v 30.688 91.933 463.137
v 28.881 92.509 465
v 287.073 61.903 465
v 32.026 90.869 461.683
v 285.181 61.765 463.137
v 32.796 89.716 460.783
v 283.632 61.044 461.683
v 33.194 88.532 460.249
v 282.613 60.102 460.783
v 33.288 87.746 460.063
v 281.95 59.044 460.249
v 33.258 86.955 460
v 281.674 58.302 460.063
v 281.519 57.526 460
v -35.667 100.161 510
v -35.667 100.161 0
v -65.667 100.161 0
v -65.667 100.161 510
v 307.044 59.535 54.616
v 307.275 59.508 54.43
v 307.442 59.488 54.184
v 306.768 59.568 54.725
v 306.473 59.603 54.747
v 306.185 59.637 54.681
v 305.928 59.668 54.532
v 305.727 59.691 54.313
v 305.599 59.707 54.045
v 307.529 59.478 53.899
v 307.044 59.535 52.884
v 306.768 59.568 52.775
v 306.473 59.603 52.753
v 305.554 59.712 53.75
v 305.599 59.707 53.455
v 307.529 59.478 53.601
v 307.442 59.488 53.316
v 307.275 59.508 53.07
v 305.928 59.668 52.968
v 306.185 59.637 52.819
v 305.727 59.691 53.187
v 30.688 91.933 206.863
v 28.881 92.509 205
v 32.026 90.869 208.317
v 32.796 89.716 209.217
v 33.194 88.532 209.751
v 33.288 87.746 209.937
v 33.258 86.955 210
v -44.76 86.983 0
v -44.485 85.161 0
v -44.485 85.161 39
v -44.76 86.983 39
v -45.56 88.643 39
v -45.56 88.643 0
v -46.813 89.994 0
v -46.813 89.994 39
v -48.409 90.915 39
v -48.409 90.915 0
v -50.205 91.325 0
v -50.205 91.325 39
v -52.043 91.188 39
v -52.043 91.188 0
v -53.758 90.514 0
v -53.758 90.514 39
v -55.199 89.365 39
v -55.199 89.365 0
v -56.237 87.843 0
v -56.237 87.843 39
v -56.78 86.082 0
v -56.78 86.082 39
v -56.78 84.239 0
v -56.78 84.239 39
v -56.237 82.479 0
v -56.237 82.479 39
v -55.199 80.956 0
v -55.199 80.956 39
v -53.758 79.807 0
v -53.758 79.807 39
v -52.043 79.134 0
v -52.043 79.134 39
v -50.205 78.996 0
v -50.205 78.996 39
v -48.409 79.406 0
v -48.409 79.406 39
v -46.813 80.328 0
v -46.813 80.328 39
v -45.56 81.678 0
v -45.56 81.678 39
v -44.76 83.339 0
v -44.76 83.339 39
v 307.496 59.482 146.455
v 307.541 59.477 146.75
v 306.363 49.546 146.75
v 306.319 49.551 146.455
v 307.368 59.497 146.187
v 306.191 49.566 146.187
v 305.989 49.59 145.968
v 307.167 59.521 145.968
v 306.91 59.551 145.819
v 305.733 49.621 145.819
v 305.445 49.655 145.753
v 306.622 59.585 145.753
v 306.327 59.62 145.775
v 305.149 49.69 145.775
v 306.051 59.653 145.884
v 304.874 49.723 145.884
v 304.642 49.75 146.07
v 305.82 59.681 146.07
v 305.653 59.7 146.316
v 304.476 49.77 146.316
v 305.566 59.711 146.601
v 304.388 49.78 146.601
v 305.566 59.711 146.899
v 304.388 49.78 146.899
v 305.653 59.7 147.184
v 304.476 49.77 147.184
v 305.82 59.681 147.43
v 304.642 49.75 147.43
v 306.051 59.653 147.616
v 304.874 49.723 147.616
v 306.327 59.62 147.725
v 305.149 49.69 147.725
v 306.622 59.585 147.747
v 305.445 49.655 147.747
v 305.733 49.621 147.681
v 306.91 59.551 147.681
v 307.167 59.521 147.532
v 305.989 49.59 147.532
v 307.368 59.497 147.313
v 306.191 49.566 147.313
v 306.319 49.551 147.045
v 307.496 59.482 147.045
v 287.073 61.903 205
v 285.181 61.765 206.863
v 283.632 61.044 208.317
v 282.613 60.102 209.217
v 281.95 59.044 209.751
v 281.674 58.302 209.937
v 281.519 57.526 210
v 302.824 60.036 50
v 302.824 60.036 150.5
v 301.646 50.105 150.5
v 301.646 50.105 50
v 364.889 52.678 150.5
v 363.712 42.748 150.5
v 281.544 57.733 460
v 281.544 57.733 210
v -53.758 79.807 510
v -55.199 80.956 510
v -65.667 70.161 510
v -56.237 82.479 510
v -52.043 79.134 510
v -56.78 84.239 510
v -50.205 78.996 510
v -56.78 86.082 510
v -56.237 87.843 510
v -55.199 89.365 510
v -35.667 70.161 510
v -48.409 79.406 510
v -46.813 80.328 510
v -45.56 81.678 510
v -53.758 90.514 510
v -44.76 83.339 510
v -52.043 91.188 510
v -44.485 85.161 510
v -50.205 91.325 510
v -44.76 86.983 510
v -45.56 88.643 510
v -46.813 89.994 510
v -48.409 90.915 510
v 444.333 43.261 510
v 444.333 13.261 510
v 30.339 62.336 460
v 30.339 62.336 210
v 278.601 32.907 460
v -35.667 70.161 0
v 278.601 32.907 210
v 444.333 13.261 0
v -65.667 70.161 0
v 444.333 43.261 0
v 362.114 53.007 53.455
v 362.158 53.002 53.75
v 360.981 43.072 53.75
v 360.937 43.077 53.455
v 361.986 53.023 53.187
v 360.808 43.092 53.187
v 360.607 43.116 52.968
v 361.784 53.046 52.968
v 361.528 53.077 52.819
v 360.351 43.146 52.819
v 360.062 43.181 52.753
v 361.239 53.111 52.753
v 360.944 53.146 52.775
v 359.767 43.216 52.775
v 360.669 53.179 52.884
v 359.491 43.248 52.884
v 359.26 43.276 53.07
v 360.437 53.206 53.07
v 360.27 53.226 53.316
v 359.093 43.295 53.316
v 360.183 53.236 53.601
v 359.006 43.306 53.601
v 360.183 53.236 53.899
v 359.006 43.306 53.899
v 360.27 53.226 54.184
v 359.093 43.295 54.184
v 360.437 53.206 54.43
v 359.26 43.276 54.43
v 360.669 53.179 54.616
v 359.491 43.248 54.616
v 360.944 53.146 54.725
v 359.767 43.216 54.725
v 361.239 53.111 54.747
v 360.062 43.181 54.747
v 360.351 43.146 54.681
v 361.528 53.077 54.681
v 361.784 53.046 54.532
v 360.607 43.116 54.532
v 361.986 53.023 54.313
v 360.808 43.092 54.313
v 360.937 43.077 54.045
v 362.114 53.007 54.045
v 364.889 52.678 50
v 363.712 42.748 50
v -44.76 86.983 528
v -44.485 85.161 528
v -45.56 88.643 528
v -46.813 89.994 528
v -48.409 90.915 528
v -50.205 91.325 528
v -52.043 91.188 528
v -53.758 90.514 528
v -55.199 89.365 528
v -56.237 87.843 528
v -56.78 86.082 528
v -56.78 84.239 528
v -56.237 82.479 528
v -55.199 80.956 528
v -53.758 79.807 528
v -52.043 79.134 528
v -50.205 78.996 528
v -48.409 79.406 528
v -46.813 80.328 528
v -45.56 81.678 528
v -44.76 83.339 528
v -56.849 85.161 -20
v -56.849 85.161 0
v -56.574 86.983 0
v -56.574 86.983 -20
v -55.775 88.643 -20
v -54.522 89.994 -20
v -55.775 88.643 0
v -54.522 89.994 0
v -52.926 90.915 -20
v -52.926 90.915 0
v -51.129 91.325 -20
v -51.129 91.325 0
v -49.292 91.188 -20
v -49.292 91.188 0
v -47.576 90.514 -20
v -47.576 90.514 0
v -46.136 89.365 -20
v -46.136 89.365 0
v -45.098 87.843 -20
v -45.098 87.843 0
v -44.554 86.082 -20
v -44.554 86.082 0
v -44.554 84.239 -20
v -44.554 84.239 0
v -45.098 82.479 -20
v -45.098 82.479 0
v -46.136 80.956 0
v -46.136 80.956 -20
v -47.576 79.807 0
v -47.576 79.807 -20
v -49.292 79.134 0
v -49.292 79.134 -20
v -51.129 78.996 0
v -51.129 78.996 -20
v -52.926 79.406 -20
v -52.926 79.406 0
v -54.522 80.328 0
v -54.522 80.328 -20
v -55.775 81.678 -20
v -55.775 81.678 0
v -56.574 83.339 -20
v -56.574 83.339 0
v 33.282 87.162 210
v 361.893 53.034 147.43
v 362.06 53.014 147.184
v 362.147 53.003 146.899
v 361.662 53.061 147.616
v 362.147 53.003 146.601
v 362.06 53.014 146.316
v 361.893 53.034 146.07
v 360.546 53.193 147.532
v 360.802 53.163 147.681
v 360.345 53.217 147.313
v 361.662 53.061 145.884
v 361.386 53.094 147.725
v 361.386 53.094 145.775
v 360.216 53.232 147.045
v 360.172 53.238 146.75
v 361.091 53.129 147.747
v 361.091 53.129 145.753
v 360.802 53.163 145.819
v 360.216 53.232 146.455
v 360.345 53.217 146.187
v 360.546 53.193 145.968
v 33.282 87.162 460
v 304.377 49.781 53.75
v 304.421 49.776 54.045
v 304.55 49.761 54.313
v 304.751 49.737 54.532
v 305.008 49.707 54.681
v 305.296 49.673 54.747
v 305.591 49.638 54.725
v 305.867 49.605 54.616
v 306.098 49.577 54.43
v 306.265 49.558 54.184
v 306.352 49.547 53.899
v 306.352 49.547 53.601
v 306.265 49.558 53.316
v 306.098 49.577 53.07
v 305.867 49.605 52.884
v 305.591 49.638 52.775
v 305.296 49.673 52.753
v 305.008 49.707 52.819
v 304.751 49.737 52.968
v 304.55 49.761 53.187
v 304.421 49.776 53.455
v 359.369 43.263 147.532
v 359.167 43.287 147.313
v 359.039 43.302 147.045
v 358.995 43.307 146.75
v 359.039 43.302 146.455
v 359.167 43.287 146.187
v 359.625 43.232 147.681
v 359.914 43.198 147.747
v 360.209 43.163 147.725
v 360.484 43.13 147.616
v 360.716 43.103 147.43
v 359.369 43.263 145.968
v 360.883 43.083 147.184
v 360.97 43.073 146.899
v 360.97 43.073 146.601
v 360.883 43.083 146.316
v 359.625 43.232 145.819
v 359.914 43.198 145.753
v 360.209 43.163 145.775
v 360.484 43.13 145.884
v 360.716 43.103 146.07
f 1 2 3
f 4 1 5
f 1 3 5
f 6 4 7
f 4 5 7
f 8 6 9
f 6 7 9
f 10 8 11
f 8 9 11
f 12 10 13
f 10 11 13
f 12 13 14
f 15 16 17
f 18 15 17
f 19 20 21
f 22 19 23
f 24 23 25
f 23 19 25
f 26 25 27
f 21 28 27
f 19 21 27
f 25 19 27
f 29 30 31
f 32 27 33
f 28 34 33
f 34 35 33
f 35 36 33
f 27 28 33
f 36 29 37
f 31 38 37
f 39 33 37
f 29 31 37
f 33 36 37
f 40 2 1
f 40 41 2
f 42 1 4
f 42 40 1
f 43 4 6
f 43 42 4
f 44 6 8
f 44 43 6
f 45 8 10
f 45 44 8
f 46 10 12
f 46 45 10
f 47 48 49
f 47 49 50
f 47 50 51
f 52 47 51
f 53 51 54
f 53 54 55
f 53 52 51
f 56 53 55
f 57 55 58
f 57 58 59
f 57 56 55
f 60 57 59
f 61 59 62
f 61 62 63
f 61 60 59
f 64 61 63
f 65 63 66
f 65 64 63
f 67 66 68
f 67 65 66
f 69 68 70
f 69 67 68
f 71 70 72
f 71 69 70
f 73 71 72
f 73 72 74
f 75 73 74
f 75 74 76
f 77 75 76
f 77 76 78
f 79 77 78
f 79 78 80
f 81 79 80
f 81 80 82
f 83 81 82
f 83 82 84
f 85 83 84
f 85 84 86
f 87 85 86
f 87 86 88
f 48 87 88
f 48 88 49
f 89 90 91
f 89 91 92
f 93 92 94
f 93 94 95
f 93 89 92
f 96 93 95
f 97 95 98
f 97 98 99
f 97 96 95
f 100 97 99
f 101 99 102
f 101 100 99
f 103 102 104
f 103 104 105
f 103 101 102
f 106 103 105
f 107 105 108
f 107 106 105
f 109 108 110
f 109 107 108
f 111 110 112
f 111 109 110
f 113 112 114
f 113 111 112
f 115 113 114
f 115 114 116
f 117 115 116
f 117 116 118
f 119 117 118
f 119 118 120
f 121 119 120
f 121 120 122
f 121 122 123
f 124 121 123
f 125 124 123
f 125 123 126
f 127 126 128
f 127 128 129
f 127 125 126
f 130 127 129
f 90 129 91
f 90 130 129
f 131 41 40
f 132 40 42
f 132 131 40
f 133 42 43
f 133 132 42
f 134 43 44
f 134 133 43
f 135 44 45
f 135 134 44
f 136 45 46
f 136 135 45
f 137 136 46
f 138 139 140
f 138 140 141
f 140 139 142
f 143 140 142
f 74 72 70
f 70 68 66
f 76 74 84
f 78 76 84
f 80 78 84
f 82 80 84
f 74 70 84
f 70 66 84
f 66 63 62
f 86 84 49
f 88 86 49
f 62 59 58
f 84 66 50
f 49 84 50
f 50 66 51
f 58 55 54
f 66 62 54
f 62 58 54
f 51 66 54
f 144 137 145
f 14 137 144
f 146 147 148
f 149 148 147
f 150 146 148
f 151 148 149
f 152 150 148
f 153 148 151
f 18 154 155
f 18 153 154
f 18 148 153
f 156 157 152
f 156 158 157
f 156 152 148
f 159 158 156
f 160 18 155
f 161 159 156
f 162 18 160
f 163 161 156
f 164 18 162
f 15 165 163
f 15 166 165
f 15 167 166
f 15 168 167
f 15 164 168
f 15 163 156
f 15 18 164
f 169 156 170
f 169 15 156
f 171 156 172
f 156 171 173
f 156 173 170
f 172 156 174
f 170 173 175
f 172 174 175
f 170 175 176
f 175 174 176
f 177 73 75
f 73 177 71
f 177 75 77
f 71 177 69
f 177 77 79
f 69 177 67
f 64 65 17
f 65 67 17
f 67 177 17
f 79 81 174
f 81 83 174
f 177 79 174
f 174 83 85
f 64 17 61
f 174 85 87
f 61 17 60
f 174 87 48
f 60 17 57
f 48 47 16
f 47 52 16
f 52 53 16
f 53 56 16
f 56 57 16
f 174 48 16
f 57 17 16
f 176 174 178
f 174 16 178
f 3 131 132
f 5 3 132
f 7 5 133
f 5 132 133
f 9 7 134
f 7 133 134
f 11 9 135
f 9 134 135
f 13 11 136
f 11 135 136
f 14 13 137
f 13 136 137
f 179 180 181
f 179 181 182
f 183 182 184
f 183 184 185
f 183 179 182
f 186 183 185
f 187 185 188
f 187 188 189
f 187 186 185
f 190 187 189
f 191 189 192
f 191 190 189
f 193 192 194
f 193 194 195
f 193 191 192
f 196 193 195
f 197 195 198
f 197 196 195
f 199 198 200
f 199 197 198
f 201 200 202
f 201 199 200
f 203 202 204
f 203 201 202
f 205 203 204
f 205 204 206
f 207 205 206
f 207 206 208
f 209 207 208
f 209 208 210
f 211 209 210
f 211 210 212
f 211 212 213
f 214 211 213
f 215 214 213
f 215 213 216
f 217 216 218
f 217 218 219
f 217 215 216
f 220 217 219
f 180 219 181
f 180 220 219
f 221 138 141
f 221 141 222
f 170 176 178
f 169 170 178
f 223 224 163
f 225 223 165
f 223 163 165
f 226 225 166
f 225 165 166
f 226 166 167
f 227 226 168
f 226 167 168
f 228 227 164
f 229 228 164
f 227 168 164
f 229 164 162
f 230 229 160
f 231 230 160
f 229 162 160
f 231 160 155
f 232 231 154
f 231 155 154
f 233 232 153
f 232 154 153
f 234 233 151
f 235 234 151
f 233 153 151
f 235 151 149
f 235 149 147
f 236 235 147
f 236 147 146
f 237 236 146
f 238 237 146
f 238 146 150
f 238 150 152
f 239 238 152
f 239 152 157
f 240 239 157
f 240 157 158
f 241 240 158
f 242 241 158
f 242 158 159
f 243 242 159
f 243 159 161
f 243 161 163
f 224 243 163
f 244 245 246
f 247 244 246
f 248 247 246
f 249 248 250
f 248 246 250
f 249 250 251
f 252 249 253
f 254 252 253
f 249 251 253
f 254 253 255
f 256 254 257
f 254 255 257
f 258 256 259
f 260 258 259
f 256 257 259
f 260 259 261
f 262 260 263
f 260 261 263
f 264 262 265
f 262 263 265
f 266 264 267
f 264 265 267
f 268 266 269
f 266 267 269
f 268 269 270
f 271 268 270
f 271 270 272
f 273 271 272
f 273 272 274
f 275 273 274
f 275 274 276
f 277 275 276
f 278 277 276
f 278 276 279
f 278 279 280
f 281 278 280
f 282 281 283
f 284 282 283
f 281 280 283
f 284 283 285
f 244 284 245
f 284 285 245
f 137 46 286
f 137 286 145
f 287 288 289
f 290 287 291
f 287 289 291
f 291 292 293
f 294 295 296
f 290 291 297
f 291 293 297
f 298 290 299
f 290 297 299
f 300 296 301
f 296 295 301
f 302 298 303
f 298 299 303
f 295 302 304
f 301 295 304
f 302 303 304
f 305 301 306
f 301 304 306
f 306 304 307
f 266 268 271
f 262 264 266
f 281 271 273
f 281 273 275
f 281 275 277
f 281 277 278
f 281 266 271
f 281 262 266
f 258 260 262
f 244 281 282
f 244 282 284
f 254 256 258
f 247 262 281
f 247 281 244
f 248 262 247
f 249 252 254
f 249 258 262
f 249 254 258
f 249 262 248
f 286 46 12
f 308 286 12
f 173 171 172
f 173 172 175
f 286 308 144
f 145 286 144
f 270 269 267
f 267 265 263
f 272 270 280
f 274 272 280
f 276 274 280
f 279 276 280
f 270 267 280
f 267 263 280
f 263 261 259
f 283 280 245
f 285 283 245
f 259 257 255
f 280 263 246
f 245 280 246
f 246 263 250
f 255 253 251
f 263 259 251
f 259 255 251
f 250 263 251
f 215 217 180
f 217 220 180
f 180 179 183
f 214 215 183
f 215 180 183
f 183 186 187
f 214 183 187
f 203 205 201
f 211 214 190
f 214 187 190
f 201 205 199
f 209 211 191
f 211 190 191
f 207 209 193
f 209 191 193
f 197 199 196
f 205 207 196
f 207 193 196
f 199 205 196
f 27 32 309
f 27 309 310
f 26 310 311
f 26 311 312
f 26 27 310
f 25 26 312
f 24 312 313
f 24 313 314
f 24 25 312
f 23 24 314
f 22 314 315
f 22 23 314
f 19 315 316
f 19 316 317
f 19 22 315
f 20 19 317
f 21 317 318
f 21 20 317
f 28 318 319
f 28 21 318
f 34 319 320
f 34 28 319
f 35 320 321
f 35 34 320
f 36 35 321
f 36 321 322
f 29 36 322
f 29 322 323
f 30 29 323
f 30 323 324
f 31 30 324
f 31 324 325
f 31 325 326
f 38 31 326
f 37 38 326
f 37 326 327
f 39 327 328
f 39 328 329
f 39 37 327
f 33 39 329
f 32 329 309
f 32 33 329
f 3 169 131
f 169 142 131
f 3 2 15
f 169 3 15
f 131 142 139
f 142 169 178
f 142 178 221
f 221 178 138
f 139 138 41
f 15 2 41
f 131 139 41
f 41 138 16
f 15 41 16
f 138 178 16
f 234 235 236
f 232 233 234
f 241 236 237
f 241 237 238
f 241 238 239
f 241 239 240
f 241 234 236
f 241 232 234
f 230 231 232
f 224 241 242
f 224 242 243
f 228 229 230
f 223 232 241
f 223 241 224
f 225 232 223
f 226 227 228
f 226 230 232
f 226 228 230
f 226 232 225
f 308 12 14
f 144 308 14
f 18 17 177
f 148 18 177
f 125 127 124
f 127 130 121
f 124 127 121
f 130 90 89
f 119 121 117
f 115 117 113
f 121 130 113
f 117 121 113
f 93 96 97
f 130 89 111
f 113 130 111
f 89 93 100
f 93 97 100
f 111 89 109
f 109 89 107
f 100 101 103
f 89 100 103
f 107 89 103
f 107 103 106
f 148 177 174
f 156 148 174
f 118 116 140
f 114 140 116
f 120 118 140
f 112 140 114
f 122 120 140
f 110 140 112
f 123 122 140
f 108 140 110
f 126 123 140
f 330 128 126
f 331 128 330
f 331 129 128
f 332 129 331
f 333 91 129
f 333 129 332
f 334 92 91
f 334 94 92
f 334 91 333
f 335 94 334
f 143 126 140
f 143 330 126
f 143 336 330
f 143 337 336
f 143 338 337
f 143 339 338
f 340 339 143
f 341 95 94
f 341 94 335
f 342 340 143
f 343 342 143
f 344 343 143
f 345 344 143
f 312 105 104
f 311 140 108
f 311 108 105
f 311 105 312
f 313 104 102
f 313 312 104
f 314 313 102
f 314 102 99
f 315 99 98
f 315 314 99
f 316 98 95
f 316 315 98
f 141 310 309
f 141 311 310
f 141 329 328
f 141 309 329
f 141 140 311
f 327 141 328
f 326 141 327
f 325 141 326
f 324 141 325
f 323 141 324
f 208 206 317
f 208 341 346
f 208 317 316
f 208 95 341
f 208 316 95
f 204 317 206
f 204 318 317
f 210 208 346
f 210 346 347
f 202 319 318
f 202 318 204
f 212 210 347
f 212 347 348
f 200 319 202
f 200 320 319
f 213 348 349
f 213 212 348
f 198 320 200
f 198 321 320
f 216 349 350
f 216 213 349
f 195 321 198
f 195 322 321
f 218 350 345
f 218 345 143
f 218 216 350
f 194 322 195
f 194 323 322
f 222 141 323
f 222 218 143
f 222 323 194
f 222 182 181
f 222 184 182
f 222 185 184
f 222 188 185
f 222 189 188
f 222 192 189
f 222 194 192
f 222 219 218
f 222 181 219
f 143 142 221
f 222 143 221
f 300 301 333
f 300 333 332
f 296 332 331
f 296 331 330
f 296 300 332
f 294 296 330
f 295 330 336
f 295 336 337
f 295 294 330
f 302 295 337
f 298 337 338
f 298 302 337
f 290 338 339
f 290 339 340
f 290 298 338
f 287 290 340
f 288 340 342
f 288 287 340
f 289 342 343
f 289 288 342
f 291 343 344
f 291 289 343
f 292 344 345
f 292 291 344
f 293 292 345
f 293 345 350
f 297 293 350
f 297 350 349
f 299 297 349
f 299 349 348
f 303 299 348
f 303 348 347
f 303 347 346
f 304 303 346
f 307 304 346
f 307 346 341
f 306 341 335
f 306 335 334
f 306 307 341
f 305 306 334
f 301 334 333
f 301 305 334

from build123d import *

# Parameters (mm, degrees)
SKETCH1_R                = 6.181856154
BOSS_EXTRUDE2_DEPTH      = 510
BOSS_EXTRUDE3_DEPTH      = 18
BOSS_EXTRUDE3_DEPTH_BACK = 471
SKETCH2_R                = 6.181856154
SKETCH3_R                = 6.181856154
BOSS_EXTRUDE4_DEPTH      = 20
SKETCH4_W                = 62.5
SKETCH4_H                = 100.5
SKETCH4_R                = 1
CUT_EXTRUDE1_DEPTH       = 10
SKETCH5_W                = 250
SKETCH5_H                = 250
CUT_EXTRUDE2_DEPTH       = 10
FILLET1_R                = 5
SKETCH6_W                = 250
SKETCH6_H                = 250
CUT_EXTRUDE3_DEPTH       = 885
SKETCH7_W                = 250
SKETCH7_H                = 250
BOSS_EXTRUDE5_DEPTH      = 25


with BuildPart() as part:
    # Sketch1 → Boss-Extrude2 (new body)
    with BuildSketch(Plane.XY):
        Polygon((-65.667198797, 100.160717384), (-65.667198797, 70.160717384), (-35.667198797, 70.160717384), (444.332801203, 13.261021336), (444.332801203, 43.261021336), (-35.667198797, 100.160717384), align=None)
        with Locations((-50.667198797, 85.160717384)):
            Circle(SKETCH1_R, mode=Mode.SUBTRACT)
    extrude(amount=BOSS_EXTRUDE2_DEPTH)

    # Sketch2 → Boss-Extrude3 (add, two sides: drawn at the far end of the back side and taken through both)
    with BuildSketch(Plane.XY.offset(510).offset(-BOSS_EXTRUDE3_DEPTH_BACK)):
        with Locations((-50.667198797, 85.160717384)):
            Circle(SKETCH2_R)
    extrude(amount=BOSS_EXTRUDE3_DEPTH + BOSS_EXTRUDE3_DEPTH_BACK)

    # Sketch4 → Cut-Extrude1 (cut)
    with BuildSketch(Plane(origin=(11.214376154, 94.603327041, 0), x_dir=(0.9930472019055131, -0.11771684156326717, 0), z_dir=(0.11771684156326717, 0.9930472019055131, 0))):
        with Locations((324.900894155, -100.25)):
            Rectangle(SKETCH4_W, SKETCH4_H)
        with Locations(Location((297.400894155, -53.75, 0), (0, 0, 180))):
            Circle(SKETCH4_R, mode=Mode.SUBTRACT)
        with Locations((352.400894155, -53.75)):
            Circle(SKETCH4_R, mode=Mode.SUBTRACT)
        with Locations(Location((352.400894155, -146.75, 0), (0, 0, 180))):
            Circle(SKETCH4_R, mode=Mode.SUBTRACT)
        with Locations((297.400894155, -146.75)):
            Circle(SKETCH4_R, mode=Mode.SUBTRACT)
    extrude(amount=-CUT_EXTRUDE1_DEPTH, mode=Mode.SUBTRACT)

    # Sketch5 → Cut-Extrude2 (cut)
    with BuildSketch(Plane(origin=(11.214376154, 94.603327041, 0), x_dir=(0.9930472019055131, -0.11771684156326717, 0), z_dir=(0.11771684156326717, 0.9930472019055131, 0))):
        with Locations((147.790184736, -335)):
            Rectangle(SKETCH5_W, SKETCH5_H)
    extrude(amount=-CUT_EXTRUDE2_DEPTH, mode=Mode.SUBTRACT)

    # Fillet1
    fillet1_edges = [part.edges().sort_by_distance(p)[0] for p in [
        (33.846105337, 91.920538475, 335),
        (157.977005575, 77.205933279, 460),
        (282.107905813, 62.491328084, 335),
        (157.977005575, 77.205933279, 210),
    ]]
    fillet(fillet1_edges, radius=FILLET1_R)

    # Sketch6 → Cut-Extrude3 (cut)
    with BuildSketch(Plane(origin=(10.037207738, 84.672855022, 0), x_dir=(0.9930472019055131, -0.11771684156326716, 0), z_dir=(0.11771684156326716, 0.9930472019055131, 0))):
        with Locations((147.790184736, -335)):
            Rectangle(SKETCH6_W, SKETCH6_H)
    extrude(amount=-CUT_EXTRUDE3_DEPTH, mode=Mode.SUBTRACT)

    # Sketch7 → Boss-Extrude5 (add)
    with BuildSketch(Plane(origin=(7.70742475, 65.019044684, 0), x_dir=(0.9930472019055131, -0.1177168415632672, 0), z_dir=(-0.1177168415632672, -0.9930472019055131, 0))):
        with Locations((147.790184736, 335)):
            Rectangle(SKETCH7_W, SKETCH7_H)
    extrude(amount=-BOSS_EXTRUDE5_DEPTH)


with BuildPart() as body_2:
    # Sketch3 → Boss-Extrude4 (new body)
    with BuildSketch(Plane(origin=(0, 0, 0), x_dir=(-1, 0, 0), z_dir=(0, 0, -1))):
        with Locations((50.667198797, 85.160717384)):
            Circle(SKETCH3_R)
    extrude(amount=BOSS_EXTRUDE4_DEPTH)


solid = Compound([part.part, body_2.part])
